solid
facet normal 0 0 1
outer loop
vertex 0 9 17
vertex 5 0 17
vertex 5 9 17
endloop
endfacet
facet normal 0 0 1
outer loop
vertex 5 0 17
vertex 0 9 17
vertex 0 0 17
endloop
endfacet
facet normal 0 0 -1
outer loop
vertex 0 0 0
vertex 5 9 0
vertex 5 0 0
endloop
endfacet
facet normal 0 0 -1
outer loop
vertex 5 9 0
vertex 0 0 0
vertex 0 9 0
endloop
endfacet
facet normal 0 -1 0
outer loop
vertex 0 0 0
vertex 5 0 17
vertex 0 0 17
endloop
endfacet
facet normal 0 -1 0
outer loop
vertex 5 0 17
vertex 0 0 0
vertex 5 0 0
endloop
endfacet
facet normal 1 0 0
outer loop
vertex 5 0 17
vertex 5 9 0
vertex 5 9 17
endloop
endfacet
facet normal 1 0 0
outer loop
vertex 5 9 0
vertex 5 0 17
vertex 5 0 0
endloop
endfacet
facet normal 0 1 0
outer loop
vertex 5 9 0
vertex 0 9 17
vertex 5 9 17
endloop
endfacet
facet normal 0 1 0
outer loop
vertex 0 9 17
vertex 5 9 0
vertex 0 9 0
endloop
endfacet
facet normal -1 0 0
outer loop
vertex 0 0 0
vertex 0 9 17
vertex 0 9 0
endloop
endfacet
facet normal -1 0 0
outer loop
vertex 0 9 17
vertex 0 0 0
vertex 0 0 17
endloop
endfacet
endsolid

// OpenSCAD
// Generated by SolidPython 1.0.1 on 2020-07-29 00:39:26


cube(size = [5, 9, 17]);
/***********************************************
*********      SolidPython code:      **********
************************************************
 
# import packages: SolidPython
from solid import *
from solid.utils import *
from itertools import chain, combinations


class Resize:

    def __init__(self, scad_file):
        self.scad_file = scad_file
        #self.scad_file = import_scad(scad_file)
        # cone/cylinder param:
        self.r1 = 0
        self.r2 = 0
        self.h = 0
        # rectangular prism param:
        self.w = 0
        self.l = 0
        # ellipse param:
        self.r = 0

    # import OpenScad code (file name corresponds to shape)


    # classify shape + parameters
    def assign(self, param1, param2, param3):
        if self.scad_file == 'cone.scad':
            self.r1 = param1
            self.r2 = param2
            self.h = param3
        elif self.scad_file == 'cylinder.scad':
            self.r1 = param1
            self.r2 = param2
            self.h = param3
        elif self.scad_file == 'rectangularPrism.scad':
            self.h = param1
            self.l = param2
            self.w = param3
        else:
            self.r = param1
            self.h = param2

    # resize parameters
    def iterate(self):
        x = range(3, 20, 2)
        i = 1
        if self.scad_file == 'cone.scad':
            tempList = list(combinations(x, 2))
            for temp in tempList:
                param1 = temp[0]
                param2 = temp[1]
                filepath = 'produced_scad_files/' + 'cone' + str(param1) + '_' + str(param2) + '_' + '.scad'
                scad_render_to_file(cylinder(h=param1, r1=param2, r2=0), filepath)

        elif self.scad_file == 'cylinder.scad':
            tempList = list(combinations(x, 3))
            for temp in tempList:
                param1 = temp[0]
                param2 = temp[1]
                filepath = 'produced_scad_files/' + 'cylinder' + str(param1) + '_' + str(param2) + '_' + '.scad'
                scad_render_to_file(cylinder(h=param1, r1=param2, r2=param2), filepath)

        elif self.scad_file == 'rectangularPrism.scad':
            tempList = list(combinations(x, 3))
            for temp in tempList:
                param1 = temp[0]
                param2 = temp[1]
                param3 = temp[2]
                filepath = 'produced_scad_files/' + 'rectangularPrism' + str(param1) + '_' + str(param2) + '_' + str(
                    param3) + '.scad'
                scad_render_to_file(cube(size=(param1, param2, param3)), filepath)

        elif self.scad_file == 'ellipse.scad':
            tempList = list(combinations(x, 4))
            for temp in tempList:
                param1 = temp[0]
                param2 = temp[1]
                param3 = temp[2]
                param4 = temp[3]
                filepath = 'produced_scad_files/' + 'ellipse' + str(param1) + '_' + str(param2) + '_' + str(param3) + '_' + str(param4) + '.scad'
                scad_render_to_file(scale([param1, param2, param3])(sphere(r=param4)), filepath)

    def render_to_scadfile(self):
        scad_render_to_file(scad, 'example.scad') 
 
************************************************/
